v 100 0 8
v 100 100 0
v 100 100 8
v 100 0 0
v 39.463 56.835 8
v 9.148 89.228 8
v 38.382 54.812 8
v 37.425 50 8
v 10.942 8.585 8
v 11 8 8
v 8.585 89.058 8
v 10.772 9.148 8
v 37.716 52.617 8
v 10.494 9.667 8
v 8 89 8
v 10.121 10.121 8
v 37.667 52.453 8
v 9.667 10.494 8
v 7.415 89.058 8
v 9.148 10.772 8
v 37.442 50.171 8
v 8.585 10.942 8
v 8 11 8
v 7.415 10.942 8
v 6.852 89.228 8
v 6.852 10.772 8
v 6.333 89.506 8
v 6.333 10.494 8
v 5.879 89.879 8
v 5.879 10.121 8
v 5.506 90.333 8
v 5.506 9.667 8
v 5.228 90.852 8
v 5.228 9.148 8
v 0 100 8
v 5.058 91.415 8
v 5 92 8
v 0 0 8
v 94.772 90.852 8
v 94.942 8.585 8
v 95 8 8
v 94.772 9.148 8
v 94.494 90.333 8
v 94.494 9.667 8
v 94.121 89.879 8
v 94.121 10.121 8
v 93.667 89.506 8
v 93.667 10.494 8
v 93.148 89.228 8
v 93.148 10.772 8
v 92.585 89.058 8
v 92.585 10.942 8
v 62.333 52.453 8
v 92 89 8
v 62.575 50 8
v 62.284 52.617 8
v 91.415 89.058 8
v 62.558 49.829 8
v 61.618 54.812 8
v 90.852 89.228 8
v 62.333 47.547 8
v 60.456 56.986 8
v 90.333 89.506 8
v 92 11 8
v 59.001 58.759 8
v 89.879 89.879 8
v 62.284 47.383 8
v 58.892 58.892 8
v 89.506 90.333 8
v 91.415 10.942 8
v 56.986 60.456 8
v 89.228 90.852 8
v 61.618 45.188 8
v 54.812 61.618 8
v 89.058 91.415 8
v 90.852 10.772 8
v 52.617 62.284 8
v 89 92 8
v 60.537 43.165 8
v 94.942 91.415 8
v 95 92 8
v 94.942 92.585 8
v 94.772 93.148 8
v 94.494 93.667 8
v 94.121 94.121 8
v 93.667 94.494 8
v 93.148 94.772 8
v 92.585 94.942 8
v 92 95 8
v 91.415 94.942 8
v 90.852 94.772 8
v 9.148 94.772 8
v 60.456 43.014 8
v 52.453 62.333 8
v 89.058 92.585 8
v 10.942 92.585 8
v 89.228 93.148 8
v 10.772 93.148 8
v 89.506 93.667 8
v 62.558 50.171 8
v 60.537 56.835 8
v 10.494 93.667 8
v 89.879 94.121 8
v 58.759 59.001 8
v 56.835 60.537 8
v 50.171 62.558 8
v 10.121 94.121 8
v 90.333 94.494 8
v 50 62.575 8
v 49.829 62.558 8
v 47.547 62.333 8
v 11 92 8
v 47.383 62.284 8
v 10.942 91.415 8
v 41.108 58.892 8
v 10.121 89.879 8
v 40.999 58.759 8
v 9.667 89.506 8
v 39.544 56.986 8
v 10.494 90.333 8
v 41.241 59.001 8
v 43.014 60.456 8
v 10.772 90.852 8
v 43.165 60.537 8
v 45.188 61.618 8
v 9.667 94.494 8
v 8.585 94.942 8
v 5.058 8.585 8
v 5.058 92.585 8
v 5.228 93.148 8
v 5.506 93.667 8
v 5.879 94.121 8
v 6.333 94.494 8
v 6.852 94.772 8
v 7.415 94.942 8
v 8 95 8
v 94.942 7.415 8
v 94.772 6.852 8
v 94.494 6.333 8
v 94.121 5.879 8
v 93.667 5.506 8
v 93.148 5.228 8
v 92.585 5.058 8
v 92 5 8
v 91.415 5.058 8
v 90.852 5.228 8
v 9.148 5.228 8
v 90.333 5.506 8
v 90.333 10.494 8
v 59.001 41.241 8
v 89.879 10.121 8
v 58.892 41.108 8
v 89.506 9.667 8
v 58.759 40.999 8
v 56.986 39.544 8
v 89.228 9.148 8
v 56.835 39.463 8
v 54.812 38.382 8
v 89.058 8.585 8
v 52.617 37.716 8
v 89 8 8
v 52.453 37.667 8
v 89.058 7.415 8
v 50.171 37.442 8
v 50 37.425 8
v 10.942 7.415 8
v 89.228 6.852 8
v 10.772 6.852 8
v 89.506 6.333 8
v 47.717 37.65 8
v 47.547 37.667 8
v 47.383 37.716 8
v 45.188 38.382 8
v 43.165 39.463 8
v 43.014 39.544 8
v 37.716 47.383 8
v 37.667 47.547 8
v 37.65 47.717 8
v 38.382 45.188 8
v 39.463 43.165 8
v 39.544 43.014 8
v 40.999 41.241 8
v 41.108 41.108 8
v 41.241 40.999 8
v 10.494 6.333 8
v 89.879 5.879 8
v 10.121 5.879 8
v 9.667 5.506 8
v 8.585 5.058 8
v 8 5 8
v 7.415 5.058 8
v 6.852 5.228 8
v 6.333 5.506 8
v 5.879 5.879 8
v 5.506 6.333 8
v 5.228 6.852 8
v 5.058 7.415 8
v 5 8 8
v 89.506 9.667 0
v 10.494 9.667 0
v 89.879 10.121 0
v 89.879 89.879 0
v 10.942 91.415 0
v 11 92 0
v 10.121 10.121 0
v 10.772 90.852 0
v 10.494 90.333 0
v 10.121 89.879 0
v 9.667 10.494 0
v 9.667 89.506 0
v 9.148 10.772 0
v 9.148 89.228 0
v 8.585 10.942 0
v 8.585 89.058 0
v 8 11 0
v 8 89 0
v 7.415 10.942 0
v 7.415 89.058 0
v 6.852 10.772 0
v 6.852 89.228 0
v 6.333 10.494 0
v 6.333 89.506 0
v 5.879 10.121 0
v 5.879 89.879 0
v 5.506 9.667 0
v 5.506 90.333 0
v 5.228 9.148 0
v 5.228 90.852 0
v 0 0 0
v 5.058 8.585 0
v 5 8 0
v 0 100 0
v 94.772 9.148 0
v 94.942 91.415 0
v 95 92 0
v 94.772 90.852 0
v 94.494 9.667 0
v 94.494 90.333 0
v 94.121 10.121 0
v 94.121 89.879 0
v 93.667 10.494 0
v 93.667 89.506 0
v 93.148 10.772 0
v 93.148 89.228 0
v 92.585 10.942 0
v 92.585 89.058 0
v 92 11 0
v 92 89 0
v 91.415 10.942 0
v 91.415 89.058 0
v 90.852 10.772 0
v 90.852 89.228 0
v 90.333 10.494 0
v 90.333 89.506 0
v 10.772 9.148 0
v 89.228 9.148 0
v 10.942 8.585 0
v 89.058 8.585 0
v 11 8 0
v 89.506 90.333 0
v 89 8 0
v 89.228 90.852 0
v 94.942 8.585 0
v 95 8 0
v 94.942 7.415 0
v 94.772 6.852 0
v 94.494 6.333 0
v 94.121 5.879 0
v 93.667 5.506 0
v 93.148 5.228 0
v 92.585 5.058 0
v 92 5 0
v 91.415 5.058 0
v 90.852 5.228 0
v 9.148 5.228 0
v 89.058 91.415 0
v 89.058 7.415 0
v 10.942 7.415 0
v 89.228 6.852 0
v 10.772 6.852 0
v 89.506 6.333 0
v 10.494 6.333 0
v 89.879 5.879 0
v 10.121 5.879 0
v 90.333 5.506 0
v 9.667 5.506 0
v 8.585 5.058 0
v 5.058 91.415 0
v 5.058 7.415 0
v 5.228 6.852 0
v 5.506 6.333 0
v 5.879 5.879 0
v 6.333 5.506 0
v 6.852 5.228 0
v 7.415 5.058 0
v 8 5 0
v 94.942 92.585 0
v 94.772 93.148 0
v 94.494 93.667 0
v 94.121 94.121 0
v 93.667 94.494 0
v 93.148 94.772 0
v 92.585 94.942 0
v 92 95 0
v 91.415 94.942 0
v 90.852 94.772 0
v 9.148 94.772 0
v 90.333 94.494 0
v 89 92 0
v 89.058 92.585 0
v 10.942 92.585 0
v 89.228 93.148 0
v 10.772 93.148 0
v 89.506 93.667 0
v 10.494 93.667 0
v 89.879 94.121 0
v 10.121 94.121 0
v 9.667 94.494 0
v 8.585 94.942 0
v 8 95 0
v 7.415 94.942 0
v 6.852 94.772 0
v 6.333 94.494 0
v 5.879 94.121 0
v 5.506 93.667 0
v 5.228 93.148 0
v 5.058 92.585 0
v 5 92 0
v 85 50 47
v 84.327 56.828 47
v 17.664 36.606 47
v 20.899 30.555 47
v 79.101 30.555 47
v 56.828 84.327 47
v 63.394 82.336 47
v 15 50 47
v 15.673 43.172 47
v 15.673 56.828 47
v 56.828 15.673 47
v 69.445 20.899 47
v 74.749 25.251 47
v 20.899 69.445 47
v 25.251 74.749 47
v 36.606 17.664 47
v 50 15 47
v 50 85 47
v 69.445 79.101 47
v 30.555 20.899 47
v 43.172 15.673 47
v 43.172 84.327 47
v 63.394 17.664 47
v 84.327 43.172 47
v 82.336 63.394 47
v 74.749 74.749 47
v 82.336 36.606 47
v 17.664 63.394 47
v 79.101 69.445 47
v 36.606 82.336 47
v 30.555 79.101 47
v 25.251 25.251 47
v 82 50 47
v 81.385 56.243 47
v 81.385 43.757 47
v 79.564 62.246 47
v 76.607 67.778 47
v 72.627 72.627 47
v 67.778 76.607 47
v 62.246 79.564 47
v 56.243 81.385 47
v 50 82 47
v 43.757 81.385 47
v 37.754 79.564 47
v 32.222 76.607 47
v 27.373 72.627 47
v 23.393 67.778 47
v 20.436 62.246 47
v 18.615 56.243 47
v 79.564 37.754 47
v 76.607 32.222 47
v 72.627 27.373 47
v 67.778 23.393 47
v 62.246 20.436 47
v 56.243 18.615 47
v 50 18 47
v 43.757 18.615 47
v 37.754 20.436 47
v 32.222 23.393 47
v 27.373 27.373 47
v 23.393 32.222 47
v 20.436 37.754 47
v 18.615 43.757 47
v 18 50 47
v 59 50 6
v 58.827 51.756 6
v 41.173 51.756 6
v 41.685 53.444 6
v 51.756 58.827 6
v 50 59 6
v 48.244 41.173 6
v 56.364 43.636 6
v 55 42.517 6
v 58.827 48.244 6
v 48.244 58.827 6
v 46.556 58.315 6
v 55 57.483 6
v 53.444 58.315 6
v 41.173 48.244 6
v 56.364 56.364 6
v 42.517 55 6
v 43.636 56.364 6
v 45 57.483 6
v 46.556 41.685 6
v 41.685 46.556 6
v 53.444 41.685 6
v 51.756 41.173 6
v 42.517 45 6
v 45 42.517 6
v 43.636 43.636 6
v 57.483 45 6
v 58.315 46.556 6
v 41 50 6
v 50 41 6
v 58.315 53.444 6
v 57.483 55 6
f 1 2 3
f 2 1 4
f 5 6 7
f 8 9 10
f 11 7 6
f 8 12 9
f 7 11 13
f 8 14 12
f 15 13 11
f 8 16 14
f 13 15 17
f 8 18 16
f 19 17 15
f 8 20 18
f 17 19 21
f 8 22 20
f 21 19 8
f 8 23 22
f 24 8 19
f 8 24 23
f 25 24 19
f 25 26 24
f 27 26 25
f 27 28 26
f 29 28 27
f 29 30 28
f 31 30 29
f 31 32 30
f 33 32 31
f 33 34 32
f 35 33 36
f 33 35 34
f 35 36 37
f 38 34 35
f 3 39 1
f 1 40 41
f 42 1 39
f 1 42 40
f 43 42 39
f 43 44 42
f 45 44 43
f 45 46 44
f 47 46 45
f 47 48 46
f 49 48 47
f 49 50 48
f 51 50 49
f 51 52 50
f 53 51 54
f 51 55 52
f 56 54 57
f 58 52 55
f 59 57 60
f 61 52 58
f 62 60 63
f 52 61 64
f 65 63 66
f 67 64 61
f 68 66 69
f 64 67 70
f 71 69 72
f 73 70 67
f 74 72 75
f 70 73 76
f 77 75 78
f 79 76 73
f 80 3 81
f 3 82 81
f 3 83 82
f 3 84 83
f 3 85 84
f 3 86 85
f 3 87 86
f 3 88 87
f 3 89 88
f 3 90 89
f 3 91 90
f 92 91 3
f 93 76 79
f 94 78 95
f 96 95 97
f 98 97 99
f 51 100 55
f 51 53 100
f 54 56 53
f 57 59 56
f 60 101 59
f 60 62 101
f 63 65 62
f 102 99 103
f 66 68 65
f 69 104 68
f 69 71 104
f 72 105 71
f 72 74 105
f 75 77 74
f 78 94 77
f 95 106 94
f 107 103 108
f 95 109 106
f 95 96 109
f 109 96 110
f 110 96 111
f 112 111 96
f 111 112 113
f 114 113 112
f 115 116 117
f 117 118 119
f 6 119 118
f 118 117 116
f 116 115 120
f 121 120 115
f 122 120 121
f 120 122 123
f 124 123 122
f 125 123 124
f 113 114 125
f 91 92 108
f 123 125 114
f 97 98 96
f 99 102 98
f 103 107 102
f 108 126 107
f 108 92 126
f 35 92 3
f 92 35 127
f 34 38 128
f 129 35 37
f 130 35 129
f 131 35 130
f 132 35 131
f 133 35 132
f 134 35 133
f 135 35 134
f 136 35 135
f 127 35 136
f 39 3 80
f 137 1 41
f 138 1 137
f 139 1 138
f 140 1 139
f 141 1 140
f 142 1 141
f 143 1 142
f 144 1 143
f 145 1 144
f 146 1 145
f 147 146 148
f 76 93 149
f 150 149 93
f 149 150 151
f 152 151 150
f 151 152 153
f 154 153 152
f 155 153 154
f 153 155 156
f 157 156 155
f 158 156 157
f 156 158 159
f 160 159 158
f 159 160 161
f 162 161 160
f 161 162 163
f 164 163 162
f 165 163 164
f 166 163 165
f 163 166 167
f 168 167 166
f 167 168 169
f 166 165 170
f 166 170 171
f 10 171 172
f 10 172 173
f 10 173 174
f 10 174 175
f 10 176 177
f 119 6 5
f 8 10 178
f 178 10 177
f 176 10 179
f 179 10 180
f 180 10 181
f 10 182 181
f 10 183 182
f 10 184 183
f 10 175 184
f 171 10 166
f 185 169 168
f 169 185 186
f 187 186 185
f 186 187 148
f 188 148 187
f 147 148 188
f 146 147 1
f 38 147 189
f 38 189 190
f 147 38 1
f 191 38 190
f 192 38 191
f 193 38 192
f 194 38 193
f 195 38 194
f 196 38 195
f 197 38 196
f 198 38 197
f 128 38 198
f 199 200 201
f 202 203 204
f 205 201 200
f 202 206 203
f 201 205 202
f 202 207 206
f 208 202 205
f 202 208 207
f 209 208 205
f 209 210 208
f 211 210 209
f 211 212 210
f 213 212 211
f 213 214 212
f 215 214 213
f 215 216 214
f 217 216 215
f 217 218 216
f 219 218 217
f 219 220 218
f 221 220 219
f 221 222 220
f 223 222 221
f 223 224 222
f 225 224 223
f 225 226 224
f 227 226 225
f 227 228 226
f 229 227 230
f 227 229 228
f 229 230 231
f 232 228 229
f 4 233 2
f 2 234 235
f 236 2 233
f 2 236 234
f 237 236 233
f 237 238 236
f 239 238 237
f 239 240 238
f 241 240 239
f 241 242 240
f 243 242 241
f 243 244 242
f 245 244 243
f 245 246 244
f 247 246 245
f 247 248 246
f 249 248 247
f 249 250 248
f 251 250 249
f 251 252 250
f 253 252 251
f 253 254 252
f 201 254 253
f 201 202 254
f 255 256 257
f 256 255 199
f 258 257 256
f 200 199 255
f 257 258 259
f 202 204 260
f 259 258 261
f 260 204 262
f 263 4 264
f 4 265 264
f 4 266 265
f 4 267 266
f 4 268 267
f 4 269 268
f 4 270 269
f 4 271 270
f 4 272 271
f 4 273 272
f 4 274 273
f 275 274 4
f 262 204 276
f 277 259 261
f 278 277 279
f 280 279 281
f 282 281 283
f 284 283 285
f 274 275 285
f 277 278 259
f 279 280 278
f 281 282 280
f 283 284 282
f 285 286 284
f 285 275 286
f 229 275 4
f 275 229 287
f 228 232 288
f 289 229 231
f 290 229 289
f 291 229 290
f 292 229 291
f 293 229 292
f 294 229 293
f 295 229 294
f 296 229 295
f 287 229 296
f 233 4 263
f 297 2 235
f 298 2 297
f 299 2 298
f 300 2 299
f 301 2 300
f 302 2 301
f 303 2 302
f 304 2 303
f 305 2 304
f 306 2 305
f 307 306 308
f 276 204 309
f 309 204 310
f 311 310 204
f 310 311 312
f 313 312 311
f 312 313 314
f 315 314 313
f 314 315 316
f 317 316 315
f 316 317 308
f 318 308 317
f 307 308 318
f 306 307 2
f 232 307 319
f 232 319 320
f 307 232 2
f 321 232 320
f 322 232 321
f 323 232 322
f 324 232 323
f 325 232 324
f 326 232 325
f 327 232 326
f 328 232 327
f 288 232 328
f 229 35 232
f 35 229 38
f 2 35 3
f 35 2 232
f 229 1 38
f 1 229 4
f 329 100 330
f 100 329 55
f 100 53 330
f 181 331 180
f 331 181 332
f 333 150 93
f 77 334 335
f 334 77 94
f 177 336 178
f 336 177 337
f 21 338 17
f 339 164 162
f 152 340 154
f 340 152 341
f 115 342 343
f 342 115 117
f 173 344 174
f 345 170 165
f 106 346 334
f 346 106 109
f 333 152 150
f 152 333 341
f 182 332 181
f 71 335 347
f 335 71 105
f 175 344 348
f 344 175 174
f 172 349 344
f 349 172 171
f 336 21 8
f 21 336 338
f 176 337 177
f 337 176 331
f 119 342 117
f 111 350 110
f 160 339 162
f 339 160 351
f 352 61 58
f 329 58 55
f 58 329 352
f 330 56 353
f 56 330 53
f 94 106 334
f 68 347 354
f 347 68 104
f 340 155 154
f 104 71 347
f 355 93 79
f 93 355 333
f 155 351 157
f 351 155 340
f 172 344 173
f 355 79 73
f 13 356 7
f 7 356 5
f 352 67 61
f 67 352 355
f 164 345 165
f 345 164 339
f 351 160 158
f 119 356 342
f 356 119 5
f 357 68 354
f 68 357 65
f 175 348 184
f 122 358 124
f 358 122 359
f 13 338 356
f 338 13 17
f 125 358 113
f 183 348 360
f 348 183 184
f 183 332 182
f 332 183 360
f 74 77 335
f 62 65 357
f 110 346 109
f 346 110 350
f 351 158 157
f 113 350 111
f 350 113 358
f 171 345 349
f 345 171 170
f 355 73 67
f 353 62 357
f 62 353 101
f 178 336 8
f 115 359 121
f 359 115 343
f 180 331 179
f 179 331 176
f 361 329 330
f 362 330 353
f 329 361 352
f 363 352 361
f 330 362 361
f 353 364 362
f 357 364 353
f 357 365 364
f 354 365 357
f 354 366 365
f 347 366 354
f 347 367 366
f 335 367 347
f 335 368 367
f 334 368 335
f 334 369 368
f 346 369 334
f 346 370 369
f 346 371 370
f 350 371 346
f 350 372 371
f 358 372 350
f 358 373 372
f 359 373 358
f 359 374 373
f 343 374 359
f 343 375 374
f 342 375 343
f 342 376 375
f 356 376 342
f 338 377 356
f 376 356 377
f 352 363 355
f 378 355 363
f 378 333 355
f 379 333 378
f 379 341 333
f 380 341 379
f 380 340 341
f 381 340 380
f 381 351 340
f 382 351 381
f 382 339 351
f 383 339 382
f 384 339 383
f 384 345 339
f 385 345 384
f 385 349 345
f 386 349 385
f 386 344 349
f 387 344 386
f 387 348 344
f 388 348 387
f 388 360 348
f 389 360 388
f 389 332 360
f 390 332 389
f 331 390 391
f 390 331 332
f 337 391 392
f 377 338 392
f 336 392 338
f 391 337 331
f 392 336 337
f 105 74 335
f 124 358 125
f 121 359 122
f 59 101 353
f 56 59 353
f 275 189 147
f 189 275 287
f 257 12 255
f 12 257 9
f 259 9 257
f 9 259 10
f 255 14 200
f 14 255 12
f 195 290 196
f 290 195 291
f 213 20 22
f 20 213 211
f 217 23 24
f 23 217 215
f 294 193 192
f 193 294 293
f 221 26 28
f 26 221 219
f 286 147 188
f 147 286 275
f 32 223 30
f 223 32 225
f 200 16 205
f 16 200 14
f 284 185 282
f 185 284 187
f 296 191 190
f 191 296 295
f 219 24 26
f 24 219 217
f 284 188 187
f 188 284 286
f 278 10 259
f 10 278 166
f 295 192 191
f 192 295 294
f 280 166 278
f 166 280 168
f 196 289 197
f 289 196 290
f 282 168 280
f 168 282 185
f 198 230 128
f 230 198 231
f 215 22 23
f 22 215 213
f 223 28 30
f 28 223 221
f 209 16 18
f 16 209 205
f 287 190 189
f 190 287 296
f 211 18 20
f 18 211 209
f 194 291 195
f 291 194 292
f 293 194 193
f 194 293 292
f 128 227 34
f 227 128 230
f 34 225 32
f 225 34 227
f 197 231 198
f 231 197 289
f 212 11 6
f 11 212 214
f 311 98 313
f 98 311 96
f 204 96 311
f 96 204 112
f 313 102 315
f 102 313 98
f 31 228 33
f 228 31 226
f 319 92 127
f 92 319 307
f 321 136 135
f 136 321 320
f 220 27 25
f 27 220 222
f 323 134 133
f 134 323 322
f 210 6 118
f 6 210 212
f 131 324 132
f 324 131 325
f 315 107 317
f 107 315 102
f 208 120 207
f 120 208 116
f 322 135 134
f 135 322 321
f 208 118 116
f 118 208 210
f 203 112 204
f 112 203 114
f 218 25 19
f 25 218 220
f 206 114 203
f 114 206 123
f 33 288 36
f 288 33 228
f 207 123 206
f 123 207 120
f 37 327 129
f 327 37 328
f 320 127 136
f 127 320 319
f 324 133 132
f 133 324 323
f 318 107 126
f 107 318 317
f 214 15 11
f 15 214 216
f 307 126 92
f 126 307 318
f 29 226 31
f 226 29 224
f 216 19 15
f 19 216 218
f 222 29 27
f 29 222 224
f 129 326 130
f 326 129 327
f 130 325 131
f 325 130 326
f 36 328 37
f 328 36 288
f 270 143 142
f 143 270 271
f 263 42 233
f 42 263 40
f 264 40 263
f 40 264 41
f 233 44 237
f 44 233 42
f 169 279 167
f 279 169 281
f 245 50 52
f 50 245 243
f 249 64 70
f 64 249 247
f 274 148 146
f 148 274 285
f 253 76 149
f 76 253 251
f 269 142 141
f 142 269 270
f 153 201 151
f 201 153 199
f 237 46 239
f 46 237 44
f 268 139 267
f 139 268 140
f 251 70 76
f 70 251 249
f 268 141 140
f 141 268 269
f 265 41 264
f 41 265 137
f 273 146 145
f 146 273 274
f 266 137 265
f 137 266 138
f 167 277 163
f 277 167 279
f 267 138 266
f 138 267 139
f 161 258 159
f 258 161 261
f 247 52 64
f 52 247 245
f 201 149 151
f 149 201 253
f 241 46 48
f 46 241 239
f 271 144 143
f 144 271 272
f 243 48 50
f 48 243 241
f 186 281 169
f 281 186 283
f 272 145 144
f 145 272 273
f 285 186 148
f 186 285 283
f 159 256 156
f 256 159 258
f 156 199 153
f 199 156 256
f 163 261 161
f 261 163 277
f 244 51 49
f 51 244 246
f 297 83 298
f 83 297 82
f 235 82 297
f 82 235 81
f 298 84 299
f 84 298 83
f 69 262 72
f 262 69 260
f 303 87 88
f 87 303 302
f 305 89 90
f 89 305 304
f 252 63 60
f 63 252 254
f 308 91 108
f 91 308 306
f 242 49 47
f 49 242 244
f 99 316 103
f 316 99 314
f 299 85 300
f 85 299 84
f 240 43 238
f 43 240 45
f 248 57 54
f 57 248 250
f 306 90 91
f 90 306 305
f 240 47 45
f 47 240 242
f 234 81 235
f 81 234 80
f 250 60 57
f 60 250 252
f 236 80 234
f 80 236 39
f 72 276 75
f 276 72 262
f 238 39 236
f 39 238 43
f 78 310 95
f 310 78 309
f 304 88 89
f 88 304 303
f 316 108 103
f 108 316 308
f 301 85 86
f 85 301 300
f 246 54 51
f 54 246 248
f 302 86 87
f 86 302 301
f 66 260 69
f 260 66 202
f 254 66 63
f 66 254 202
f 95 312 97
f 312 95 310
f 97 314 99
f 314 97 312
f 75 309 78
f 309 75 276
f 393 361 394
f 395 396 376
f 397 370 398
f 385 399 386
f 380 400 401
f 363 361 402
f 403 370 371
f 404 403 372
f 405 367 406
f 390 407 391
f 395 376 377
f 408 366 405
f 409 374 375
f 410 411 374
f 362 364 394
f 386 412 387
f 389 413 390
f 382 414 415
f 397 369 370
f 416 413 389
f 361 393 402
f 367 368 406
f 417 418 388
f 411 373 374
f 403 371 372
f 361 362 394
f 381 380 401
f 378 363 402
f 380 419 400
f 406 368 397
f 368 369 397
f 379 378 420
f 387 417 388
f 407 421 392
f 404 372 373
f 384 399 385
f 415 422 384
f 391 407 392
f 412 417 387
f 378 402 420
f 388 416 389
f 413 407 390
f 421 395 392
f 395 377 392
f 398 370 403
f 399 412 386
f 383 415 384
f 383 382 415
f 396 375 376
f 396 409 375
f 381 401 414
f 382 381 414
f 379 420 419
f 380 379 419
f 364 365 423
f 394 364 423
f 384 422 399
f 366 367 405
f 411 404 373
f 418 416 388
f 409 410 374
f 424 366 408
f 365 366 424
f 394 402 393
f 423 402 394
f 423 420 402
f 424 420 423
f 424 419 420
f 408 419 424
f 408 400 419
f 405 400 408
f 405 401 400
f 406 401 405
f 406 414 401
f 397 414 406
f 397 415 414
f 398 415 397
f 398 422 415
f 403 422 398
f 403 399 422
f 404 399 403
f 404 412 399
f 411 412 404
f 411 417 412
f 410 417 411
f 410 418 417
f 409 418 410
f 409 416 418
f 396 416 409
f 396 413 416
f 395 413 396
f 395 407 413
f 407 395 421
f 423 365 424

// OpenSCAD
$fn = 32;

// ----------------------------------------------------------------------
// Hopper: flanged with square flange
// ----------------------------------------------------------------------

// --- parameters (mm) ---
fl = 100;                 // flange side, X and Y
fl_t = 8;                 // flange thickness
cone_h = 40;              // cone height above the flange
top_d = 70;               // cone mouth diameter
bot_d = 24;               // cone spout diameter
wall = 3;                 // cone wall thickness
hole_r = 3;               // flange hole radius
hole_in = 8;              // hole inset from the corners
fit_tol = 0.05;           // tolerance for press fits, mm
free_tol = 0.2;           // tolerance for clearance fits, mm

bore_d = bot_d - 2 * wall;  // spout bore diameter
total_h = fl_t + cone_h - 1;  // overall height

difference() {
  union() {
    cube([fl, fl, fl_t]);
    translate([fl / 2, fl / 2, fl_t - 1])
      cylinder(h = cone_h, d1 = bot_d, d2 = top_d);
  }
  translate([fl / 2, fl / 2, fl_t - 2])
    cylinder(h = cone_h + 1, d1 = bore_d, d2 = top_d - 2 * wall);
  for (sx = [0, 1], sy = [0, 1])
    translate([sx ? fl - hole_in : hole_in,
               sy ? fl - hole_in : hole_in, -1])
      cylinder(r = hole_r, h = fl_t + 2);
}
